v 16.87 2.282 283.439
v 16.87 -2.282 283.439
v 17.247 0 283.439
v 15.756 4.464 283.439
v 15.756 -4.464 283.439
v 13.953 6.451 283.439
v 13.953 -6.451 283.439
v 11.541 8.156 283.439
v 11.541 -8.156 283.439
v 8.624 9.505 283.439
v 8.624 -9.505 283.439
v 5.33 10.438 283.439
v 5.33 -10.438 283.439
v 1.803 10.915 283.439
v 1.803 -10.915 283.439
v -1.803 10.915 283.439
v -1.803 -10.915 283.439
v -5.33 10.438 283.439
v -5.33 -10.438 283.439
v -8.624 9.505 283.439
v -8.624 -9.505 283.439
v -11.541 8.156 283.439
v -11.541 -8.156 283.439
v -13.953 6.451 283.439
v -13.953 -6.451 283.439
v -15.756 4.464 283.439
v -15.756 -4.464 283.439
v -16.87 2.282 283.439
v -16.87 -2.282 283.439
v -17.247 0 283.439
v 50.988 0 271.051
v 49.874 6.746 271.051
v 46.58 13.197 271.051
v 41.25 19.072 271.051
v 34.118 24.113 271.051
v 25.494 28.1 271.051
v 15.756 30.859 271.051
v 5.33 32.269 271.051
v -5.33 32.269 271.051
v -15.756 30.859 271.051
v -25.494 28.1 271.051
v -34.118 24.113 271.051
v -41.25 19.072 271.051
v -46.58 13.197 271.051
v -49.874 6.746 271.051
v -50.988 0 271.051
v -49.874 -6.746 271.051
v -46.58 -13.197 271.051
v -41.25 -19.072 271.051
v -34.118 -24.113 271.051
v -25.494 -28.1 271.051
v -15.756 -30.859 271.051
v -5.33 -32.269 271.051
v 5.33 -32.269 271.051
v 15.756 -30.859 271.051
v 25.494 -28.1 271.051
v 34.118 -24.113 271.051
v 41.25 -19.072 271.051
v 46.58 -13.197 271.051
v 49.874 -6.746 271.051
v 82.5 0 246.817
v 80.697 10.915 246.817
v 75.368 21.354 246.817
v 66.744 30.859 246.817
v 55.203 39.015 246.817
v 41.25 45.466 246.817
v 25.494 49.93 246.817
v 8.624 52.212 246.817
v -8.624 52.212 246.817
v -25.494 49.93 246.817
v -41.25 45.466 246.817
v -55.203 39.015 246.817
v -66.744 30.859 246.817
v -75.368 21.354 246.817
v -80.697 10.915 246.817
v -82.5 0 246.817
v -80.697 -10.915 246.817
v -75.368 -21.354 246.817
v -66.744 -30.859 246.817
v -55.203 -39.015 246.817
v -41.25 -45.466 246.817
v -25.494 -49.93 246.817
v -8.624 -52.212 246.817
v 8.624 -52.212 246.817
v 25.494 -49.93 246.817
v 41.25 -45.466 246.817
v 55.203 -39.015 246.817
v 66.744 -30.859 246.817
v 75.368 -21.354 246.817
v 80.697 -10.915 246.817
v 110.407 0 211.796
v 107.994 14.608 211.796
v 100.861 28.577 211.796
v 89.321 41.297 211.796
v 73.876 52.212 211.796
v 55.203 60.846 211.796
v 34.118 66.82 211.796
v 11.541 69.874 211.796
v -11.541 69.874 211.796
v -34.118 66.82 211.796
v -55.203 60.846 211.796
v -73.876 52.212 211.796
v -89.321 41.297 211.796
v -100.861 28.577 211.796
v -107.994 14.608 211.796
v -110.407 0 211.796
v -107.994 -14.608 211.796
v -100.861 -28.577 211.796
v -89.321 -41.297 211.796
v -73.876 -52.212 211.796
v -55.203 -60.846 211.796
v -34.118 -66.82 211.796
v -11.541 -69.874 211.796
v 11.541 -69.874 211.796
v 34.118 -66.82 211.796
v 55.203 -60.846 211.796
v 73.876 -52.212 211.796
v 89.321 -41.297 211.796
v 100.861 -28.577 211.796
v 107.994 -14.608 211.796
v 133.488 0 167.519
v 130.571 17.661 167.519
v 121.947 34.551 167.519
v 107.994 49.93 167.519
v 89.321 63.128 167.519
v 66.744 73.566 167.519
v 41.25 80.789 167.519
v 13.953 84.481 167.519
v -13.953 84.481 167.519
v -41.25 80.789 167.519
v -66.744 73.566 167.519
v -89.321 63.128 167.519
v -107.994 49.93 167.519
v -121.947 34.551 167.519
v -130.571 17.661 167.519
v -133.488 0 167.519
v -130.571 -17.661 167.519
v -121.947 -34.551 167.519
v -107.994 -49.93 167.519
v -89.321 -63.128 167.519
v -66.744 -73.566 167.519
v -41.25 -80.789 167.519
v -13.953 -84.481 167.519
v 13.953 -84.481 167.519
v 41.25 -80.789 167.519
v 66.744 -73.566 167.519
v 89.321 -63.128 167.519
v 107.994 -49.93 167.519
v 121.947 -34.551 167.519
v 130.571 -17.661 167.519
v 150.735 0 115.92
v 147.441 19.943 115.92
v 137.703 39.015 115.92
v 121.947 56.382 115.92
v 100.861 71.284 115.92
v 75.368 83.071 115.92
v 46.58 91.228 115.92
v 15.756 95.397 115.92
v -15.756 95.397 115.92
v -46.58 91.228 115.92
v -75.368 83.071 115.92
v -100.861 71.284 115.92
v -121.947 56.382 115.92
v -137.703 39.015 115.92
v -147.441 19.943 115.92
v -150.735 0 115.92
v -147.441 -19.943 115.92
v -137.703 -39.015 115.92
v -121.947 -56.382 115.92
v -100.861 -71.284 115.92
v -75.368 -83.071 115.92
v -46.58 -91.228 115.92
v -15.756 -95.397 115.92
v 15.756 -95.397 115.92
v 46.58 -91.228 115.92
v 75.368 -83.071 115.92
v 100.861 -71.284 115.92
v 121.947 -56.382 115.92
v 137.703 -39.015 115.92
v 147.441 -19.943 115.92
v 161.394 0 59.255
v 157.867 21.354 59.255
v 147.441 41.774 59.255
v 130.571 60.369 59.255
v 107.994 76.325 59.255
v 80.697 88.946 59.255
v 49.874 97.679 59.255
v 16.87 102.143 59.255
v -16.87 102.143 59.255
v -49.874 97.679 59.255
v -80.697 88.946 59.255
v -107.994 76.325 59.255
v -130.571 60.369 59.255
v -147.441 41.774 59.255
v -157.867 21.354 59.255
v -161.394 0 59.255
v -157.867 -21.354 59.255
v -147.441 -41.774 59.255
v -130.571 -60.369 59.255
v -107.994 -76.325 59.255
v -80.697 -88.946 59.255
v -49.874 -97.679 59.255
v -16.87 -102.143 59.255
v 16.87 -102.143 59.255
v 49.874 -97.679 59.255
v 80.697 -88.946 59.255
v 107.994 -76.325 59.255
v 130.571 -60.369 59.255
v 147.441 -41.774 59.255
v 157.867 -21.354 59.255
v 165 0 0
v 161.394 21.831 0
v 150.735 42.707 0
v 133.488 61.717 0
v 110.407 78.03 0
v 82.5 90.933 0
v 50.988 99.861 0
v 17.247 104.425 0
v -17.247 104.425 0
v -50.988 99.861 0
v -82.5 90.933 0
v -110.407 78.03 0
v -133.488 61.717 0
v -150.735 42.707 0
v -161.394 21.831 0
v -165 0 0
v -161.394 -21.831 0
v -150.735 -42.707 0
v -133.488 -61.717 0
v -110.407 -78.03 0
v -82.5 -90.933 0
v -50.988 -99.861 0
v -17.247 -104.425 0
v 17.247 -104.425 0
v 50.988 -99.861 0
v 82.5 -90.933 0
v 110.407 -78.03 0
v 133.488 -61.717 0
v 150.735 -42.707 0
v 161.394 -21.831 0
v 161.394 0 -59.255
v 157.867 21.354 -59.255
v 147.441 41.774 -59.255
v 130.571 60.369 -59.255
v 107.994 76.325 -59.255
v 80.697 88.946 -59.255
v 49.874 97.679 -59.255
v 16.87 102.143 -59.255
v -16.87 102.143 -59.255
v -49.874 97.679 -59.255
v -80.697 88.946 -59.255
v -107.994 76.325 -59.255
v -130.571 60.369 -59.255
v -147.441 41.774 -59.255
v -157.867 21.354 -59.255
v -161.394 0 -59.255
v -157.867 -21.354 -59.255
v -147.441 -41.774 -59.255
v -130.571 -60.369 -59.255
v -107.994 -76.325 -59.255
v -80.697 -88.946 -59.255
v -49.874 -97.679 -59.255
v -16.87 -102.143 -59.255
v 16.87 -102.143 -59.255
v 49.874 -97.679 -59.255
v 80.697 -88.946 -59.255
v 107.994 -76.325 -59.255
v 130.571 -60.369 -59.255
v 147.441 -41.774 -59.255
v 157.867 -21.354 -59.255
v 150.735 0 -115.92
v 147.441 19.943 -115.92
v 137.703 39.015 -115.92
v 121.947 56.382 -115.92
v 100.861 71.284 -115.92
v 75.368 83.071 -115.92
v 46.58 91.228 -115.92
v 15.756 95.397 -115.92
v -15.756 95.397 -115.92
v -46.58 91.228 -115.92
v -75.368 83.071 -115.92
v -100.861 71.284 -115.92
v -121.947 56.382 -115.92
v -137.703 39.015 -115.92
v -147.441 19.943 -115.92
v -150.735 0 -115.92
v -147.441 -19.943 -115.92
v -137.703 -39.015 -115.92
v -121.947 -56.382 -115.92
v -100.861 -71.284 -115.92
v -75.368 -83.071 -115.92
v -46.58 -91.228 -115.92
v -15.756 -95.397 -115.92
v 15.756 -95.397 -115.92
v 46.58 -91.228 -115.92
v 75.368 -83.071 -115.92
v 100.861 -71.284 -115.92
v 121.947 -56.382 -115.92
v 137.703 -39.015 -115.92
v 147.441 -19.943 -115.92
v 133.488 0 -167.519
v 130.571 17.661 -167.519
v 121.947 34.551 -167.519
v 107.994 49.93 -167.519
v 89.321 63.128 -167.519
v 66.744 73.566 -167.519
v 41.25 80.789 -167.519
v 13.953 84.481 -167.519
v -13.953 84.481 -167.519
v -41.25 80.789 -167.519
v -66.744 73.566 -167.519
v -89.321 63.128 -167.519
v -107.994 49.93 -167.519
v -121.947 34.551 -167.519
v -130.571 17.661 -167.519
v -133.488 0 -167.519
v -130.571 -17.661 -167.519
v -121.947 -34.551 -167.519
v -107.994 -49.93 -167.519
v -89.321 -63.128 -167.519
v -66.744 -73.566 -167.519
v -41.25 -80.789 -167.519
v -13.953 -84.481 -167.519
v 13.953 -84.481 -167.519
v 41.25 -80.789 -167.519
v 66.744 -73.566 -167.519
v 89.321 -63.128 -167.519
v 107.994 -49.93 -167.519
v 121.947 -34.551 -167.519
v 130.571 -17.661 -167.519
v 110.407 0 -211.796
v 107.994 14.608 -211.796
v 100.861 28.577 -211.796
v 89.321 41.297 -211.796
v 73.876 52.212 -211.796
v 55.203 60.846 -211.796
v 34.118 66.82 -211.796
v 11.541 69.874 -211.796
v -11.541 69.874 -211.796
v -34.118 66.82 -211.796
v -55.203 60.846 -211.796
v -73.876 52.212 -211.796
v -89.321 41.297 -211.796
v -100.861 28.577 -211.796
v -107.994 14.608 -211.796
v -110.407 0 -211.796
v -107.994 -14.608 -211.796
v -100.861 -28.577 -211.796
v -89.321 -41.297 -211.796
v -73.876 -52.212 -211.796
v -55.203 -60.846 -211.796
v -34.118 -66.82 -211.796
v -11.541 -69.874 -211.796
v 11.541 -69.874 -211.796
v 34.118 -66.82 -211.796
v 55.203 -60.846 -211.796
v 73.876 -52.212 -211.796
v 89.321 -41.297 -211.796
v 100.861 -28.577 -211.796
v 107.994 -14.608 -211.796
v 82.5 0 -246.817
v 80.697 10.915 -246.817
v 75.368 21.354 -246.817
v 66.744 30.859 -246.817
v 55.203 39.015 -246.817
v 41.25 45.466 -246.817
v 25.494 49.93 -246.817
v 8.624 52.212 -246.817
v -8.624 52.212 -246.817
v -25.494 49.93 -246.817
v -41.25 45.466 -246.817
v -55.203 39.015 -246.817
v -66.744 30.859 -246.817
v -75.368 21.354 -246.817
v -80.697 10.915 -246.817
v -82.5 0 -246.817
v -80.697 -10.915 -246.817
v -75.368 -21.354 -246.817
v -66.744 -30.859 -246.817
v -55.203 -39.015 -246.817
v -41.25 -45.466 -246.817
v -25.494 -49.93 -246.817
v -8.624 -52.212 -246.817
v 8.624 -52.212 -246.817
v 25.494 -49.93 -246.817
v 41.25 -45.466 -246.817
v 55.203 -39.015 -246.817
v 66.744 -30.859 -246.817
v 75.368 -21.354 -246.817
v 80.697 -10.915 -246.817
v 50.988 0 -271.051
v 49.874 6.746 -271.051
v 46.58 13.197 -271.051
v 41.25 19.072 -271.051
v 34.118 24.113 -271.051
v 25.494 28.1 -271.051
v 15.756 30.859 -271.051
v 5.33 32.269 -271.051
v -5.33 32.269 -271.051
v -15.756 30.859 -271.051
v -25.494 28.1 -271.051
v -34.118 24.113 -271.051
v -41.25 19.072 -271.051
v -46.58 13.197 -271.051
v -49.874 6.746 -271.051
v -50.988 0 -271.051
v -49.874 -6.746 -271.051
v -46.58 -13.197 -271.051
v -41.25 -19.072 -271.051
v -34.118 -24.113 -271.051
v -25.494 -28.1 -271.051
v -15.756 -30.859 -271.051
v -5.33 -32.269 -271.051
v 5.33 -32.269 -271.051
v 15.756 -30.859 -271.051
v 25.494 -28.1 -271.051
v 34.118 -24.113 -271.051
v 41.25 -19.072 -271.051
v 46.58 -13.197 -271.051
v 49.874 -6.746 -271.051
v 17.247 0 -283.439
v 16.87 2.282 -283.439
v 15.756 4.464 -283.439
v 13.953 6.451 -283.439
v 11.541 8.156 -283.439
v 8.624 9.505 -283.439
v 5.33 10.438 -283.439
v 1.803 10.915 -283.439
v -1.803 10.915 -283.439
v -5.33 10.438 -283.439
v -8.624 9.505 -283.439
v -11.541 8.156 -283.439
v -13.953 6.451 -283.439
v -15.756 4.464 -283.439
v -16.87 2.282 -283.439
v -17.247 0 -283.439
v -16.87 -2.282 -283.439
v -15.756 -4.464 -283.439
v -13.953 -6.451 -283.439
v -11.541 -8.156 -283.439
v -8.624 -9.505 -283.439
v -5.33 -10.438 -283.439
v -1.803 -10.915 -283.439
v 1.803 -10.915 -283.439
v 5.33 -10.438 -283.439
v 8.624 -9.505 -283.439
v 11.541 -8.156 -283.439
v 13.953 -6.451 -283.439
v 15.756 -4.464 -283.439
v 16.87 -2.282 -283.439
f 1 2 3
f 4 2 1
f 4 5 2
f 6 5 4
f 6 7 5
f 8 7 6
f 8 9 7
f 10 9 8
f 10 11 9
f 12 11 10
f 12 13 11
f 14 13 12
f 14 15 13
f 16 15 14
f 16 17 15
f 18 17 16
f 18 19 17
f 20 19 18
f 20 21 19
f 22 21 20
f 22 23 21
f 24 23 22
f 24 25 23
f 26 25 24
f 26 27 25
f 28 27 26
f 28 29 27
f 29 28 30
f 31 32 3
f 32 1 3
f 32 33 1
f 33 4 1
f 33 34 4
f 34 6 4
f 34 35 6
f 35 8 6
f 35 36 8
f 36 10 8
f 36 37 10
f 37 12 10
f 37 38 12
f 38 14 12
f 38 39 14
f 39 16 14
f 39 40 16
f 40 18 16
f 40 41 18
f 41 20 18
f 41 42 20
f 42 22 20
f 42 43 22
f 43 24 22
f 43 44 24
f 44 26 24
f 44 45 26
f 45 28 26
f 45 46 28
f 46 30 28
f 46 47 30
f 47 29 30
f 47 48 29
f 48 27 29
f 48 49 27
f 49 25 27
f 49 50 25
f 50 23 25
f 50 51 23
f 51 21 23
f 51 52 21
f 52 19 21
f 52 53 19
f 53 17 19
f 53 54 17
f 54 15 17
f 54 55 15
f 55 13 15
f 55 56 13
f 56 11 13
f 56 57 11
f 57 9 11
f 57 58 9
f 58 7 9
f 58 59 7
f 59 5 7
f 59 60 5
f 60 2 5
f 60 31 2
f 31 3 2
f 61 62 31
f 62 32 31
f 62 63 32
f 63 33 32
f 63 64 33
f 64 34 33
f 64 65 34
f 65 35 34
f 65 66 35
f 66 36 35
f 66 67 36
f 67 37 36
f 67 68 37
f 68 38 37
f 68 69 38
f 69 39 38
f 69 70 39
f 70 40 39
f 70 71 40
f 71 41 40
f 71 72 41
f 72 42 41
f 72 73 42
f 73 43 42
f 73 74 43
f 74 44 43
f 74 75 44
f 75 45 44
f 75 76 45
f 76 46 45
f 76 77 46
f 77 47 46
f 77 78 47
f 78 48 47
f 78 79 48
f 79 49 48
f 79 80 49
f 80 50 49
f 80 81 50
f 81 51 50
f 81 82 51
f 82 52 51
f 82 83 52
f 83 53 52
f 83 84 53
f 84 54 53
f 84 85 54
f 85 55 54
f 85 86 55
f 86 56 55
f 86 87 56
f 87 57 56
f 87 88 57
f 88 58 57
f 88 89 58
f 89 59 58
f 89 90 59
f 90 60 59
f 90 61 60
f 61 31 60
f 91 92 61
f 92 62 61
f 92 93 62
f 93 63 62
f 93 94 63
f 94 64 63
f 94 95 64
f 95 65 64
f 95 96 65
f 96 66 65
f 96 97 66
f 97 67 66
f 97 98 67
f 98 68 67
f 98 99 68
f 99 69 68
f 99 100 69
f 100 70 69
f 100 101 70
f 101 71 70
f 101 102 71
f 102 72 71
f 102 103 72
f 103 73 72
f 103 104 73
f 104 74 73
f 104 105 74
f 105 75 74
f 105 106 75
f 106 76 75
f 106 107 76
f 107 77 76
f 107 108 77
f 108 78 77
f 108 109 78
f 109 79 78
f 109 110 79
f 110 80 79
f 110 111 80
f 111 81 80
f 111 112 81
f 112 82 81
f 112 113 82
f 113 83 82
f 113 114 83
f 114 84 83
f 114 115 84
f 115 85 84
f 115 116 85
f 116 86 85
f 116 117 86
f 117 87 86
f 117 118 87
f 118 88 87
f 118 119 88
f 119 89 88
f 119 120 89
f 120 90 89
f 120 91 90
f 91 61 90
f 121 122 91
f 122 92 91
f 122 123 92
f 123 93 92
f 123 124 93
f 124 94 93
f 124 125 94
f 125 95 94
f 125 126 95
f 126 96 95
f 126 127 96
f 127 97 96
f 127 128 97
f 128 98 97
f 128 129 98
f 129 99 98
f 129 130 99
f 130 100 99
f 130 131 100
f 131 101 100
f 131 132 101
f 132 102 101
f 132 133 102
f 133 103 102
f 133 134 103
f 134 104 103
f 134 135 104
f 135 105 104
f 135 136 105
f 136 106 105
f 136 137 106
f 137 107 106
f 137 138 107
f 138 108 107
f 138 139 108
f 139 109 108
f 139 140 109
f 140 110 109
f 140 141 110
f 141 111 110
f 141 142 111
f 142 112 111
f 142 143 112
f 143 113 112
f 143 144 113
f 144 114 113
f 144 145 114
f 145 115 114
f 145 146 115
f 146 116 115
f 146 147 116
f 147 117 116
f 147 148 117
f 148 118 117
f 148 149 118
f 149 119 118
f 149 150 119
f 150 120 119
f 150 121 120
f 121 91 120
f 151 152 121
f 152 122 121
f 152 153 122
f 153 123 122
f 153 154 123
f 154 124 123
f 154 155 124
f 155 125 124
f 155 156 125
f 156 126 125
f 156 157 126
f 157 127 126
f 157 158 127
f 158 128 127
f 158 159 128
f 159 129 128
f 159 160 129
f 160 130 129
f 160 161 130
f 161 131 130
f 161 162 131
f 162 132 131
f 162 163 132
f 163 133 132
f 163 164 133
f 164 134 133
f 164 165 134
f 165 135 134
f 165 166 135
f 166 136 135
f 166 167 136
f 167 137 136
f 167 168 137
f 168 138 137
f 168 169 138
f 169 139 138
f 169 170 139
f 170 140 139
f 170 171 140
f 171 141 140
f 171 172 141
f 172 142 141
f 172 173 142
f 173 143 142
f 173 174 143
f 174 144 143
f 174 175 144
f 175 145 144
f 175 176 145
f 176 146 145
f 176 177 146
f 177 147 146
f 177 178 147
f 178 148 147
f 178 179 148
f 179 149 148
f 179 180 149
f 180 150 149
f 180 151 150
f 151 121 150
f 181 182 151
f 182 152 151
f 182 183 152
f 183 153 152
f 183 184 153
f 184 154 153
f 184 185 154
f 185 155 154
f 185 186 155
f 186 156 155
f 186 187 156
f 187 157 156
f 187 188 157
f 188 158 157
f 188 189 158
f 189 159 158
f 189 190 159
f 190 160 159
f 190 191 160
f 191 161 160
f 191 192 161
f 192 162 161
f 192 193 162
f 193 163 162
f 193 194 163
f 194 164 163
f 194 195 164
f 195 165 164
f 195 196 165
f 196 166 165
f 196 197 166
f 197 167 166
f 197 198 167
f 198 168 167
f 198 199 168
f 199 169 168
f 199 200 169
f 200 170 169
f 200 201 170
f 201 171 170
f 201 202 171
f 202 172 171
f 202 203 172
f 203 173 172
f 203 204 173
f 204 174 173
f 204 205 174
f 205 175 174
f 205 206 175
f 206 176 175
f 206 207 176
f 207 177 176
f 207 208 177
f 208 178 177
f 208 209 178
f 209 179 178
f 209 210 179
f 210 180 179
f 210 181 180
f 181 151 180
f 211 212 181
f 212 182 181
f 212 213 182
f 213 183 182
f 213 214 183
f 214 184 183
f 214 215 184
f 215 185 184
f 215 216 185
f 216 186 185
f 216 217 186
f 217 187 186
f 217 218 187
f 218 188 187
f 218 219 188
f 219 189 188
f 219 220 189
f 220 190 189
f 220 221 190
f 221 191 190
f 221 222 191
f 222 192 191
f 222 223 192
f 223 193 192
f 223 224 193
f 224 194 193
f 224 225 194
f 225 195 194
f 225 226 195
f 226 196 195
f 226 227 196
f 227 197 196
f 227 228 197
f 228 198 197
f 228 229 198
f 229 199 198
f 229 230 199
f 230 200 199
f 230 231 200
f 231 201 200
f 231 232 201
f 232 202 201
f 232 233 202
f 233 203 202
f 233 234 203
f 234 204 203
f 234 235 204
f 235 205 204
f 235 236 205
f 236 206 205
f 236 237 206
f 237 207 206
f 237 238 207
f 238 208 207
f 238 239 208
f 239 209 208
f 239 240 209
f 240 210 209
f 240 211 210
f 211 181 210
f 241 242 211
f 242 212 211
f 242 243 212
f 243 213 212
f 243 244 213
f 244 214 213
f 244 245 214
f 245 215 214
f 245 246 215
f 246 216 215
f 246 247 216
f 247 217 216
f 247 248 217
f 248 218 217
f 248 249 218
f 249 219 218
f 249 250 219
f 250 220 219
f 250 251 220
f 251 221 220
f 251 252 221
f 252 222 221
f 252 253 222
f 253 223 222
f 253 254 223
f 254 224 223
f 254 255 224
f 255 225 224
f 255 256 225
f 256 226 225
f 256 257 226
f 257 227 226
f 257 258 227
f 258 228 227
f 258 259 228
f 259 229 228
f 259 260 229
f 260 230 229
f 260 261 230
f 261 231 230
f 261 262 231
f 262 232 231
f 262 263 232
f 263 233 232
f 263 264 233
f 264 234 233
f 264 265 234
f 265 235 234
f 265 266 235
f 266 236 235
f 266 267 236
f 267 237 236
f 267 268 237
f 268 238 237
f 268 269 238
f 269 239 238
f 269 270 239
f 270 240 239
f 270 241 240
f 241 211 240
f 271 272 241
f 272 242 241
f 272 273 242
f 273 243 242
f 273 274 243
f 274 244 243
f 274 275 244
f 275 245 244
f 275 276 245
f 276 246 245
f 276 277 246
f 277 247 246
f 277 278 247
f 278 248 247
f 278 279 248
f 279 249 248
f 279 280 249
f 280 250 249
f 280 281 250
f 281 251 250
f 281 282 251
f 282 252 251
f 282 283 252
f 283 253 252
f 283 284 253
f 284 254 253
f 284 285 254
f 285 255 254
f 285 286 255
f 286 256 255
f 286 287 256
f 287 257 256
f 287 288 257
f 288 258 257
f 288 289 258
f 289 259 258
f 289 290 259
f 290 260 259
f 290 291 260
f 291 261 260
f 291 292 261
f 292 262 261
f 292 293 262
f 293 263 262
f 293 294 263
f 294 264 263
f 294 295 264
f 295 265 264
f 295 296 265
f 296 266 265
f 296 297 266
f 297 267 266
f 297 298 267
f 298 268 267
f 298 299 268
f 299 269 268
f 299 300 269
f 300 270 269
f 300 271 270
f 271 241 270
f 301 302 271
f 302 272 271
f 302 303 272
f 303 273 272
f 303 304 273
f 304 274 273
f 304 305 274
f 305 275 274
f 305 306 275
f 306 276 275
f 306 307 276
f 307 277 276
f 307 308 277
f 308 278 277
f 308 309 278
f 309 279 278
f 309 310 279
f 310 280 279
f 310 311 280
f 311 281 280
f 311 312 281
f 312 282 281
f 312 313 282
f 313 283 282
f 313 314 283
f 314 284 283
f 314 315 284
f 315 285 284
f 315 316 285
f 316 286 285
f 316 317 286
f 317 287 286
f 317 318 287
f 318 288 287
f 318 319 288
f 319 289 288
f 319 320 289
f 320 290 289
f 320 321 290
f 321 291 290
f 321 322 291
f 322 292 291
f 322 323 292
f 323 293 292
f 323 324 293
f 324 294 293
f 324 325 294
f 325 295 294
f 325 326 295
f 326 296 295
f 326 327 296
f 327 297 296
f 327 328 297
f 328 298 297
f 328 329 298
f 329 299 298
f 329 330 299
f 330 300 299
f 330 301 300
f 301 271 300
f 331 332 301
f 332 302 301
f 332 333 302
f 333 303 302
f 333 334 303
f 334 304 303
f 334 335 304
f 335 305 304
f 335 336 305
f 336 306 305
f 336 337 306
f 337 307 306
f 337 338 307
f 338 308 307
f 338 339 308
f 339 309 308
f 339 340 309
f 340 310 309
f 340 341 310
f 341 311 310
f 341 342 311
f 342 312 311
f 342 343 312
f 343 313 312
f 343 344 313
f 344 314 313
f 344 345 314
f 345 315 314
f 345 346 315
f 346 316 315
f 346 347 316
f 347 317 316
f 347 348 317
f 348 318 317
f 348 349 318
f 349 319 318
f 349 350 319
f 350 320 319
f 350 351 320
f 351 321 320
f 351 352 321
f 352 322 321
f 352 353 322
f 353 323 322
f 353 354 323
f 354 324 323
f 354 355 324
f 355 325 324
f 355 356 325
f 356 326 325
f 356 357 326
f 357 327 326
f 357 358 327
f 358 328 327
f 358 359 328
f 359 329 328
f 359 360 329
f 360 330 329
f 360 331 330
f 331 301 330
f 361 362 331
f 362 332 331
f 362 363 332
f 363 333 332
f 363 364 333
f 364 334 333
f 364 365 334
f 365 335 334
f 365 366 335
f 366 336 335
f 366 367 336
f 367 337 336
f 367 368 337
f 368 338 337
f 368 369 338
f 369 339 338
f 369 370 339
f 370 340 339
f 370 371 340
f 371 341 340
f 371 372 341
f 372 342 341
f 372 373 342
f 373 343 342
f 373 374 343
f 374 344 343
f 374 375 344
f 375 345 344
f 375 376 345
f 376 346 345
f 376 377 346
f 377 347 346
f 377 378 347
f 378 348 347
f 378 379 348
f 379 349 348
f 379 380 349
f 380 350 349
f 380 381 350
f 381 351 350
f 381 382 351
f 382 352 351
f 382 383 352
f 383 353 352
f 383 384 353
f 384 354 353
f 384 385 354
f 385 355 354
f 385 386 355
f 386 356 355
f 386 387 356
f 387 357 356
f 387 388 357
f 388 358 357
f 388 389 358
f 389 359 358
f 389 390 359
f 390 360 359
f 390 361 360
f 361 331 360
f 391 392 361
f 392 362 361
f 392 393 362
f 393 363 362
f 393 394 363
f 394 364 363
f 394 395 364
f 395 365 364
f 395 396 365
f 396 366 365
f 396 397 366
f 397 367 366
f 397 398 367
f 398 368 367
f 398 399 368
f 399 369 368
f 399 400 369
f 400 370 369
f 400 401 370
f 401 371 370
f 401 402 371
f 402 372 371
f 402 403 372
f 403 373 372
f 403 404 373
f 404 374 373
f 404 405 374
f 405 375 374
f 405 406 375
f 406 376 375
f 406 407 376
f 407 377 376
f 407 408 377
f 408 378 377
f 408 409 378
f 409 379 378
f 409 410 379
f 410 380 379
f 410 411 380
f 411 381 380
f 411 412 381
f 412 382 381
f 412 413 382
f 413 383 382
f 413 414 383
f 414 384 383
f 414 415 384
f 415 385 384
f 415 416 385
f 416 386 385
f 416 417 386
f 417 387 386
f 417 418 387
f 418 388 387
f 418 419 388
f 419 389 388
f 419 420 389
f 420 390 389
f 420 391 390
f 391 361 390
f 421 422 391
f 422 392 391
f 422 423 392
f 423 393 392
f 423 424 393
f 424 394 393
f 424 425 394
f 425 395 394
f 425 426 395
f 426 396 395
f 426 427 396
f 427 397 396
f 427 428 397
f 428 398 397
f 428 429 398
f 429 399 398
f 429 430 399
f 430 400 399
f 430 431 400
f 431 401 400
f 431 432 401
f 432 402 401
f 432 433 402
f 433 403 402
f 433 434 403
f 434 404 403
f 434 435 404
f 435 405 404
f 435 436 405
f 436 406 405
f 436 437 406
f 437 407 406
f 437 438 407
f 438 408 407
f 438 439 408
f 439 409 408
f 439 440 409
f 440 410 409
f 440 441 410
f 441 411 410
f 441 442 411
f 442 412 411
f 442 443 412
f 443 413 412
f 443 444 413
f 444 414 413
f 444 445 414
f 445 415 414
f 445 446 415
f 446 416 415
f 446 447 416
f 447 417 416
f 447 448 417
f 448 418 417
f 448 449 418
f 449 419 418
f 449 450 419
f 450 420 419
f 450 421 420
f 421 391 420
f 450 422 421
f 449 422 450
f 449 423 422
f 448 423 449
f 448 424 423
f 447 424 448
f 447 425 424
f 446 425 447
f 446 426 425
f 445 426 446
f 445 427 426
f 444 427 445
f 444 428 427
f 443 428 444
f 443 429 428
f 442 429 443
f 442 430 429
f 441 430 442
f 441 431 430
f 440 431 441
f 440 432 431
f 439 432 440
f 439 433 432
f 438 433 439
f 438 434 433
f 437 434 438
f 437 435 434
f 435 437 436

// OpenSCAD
// Generated by SolidPython 1.0.1 on 2020-07-29 00:46:49


scale(v = [11, 7, 19]) {
	sphere(r = 15);
}
/***********************************************
*********      SolidPython code:      **********
************************************************
 
# import packages: SolidPython
from solid import *
from solid.utils import *
from itertools import chain, combinations, permutations


class Resize:

    def __init__(self, scad_file):
        self.scad_file = scad_file
        #self.scad_file = import_scad(scad_file)
        # cone/cylinder param:
        self.r1 = 0
        self.r2 = 0
        self.h = 0
        # rectangular prism param:
        self.w = 0
        self.l = 0
        # ellipse param:
        self.r = 0

    # import OpenScad code (file name corresponds to shape)


    # classify shape + parameters
    def assign(self, param1, param2, param3):
        if self.scad_file == 'cone.scad':
            self.r1 = param1
            self.r2 = param2
            self.h = param3
        elif self.scad_file == 'cylinder.scad':
            self.r1 = param1
            self.r2 = param2
            self.h = param3
        elif self.scad_file == 'rectangularPrism.scad':
            self.h = param1
            self.l = param2
            self.w = param3
        else:
            self.r = param1
            self.h = param2

    # resize parameters
    def iterate(self):
        x = range(3, 20, 2)
        i = 1
        if self.scad_file == 'cone.scad':
            tempList = list(permutations(x, 2))
            for temp in tempList:
                param1 = temp[0]
                param2 = temp[1]
                filepath = 'produced_scad_files/' + 'cone' + str(param1) + '_' + str(param2) + '_' + '.scad'
                scad_render_to_file(cylinder(h=param1, r1=param2, r2=0), filepath)

        elif self.scad_file == 'cylinder.scad':
            tempList = list(permutations(x, 3))
            for temp in tempList:
                param1 = temp[0]
                param2 = temp[1]
                filepath = 'produced_scad_files/' + 'cylinder' + str(param1) + '_' + str(param2) + '_' + '.scad'
                scad_render_to_file(cylinder(h=param1, r1=param2, r2=param2), filepath)

        elif self.scad_file == 'rectangularPrism.scad':
            tempList = list(permutations(x, 3))
            for temp in tempList:
                param1 = temp[0]
                param2 = temp[1]
                param3 = temp[2]
                filepath = 'produced_scad_files/' + 'rectangularPrism' + str(param1) + '_' + str(param2) + '_' + str(
                    param3) + '.scad'
                scad_render_to_file(cube(size=(param1, param2, param3)), filepath)

        elif self.scad_file == 'ellipse.scad':
            tempList = list(permutations(x, 4))
            for temp in tempList:
                param1 = temp[0]
                param2 = temp[1]
                param3 = temp[2]
                param4 = temp[3]
                filepath = 'produced_scad_files/' + 'ellipse' + str(param1) + '_' + str(param2) + '_' + str(param3) + '_' + str(param4) + '.scad'
                scad_render_to_file(scale([param1, param2, param3])(sphere(r=param4)), filepath)

    def render_to_scadfile(self):
        scad_render_to_file(scad, 'example.scad') 
 
************************************************/
